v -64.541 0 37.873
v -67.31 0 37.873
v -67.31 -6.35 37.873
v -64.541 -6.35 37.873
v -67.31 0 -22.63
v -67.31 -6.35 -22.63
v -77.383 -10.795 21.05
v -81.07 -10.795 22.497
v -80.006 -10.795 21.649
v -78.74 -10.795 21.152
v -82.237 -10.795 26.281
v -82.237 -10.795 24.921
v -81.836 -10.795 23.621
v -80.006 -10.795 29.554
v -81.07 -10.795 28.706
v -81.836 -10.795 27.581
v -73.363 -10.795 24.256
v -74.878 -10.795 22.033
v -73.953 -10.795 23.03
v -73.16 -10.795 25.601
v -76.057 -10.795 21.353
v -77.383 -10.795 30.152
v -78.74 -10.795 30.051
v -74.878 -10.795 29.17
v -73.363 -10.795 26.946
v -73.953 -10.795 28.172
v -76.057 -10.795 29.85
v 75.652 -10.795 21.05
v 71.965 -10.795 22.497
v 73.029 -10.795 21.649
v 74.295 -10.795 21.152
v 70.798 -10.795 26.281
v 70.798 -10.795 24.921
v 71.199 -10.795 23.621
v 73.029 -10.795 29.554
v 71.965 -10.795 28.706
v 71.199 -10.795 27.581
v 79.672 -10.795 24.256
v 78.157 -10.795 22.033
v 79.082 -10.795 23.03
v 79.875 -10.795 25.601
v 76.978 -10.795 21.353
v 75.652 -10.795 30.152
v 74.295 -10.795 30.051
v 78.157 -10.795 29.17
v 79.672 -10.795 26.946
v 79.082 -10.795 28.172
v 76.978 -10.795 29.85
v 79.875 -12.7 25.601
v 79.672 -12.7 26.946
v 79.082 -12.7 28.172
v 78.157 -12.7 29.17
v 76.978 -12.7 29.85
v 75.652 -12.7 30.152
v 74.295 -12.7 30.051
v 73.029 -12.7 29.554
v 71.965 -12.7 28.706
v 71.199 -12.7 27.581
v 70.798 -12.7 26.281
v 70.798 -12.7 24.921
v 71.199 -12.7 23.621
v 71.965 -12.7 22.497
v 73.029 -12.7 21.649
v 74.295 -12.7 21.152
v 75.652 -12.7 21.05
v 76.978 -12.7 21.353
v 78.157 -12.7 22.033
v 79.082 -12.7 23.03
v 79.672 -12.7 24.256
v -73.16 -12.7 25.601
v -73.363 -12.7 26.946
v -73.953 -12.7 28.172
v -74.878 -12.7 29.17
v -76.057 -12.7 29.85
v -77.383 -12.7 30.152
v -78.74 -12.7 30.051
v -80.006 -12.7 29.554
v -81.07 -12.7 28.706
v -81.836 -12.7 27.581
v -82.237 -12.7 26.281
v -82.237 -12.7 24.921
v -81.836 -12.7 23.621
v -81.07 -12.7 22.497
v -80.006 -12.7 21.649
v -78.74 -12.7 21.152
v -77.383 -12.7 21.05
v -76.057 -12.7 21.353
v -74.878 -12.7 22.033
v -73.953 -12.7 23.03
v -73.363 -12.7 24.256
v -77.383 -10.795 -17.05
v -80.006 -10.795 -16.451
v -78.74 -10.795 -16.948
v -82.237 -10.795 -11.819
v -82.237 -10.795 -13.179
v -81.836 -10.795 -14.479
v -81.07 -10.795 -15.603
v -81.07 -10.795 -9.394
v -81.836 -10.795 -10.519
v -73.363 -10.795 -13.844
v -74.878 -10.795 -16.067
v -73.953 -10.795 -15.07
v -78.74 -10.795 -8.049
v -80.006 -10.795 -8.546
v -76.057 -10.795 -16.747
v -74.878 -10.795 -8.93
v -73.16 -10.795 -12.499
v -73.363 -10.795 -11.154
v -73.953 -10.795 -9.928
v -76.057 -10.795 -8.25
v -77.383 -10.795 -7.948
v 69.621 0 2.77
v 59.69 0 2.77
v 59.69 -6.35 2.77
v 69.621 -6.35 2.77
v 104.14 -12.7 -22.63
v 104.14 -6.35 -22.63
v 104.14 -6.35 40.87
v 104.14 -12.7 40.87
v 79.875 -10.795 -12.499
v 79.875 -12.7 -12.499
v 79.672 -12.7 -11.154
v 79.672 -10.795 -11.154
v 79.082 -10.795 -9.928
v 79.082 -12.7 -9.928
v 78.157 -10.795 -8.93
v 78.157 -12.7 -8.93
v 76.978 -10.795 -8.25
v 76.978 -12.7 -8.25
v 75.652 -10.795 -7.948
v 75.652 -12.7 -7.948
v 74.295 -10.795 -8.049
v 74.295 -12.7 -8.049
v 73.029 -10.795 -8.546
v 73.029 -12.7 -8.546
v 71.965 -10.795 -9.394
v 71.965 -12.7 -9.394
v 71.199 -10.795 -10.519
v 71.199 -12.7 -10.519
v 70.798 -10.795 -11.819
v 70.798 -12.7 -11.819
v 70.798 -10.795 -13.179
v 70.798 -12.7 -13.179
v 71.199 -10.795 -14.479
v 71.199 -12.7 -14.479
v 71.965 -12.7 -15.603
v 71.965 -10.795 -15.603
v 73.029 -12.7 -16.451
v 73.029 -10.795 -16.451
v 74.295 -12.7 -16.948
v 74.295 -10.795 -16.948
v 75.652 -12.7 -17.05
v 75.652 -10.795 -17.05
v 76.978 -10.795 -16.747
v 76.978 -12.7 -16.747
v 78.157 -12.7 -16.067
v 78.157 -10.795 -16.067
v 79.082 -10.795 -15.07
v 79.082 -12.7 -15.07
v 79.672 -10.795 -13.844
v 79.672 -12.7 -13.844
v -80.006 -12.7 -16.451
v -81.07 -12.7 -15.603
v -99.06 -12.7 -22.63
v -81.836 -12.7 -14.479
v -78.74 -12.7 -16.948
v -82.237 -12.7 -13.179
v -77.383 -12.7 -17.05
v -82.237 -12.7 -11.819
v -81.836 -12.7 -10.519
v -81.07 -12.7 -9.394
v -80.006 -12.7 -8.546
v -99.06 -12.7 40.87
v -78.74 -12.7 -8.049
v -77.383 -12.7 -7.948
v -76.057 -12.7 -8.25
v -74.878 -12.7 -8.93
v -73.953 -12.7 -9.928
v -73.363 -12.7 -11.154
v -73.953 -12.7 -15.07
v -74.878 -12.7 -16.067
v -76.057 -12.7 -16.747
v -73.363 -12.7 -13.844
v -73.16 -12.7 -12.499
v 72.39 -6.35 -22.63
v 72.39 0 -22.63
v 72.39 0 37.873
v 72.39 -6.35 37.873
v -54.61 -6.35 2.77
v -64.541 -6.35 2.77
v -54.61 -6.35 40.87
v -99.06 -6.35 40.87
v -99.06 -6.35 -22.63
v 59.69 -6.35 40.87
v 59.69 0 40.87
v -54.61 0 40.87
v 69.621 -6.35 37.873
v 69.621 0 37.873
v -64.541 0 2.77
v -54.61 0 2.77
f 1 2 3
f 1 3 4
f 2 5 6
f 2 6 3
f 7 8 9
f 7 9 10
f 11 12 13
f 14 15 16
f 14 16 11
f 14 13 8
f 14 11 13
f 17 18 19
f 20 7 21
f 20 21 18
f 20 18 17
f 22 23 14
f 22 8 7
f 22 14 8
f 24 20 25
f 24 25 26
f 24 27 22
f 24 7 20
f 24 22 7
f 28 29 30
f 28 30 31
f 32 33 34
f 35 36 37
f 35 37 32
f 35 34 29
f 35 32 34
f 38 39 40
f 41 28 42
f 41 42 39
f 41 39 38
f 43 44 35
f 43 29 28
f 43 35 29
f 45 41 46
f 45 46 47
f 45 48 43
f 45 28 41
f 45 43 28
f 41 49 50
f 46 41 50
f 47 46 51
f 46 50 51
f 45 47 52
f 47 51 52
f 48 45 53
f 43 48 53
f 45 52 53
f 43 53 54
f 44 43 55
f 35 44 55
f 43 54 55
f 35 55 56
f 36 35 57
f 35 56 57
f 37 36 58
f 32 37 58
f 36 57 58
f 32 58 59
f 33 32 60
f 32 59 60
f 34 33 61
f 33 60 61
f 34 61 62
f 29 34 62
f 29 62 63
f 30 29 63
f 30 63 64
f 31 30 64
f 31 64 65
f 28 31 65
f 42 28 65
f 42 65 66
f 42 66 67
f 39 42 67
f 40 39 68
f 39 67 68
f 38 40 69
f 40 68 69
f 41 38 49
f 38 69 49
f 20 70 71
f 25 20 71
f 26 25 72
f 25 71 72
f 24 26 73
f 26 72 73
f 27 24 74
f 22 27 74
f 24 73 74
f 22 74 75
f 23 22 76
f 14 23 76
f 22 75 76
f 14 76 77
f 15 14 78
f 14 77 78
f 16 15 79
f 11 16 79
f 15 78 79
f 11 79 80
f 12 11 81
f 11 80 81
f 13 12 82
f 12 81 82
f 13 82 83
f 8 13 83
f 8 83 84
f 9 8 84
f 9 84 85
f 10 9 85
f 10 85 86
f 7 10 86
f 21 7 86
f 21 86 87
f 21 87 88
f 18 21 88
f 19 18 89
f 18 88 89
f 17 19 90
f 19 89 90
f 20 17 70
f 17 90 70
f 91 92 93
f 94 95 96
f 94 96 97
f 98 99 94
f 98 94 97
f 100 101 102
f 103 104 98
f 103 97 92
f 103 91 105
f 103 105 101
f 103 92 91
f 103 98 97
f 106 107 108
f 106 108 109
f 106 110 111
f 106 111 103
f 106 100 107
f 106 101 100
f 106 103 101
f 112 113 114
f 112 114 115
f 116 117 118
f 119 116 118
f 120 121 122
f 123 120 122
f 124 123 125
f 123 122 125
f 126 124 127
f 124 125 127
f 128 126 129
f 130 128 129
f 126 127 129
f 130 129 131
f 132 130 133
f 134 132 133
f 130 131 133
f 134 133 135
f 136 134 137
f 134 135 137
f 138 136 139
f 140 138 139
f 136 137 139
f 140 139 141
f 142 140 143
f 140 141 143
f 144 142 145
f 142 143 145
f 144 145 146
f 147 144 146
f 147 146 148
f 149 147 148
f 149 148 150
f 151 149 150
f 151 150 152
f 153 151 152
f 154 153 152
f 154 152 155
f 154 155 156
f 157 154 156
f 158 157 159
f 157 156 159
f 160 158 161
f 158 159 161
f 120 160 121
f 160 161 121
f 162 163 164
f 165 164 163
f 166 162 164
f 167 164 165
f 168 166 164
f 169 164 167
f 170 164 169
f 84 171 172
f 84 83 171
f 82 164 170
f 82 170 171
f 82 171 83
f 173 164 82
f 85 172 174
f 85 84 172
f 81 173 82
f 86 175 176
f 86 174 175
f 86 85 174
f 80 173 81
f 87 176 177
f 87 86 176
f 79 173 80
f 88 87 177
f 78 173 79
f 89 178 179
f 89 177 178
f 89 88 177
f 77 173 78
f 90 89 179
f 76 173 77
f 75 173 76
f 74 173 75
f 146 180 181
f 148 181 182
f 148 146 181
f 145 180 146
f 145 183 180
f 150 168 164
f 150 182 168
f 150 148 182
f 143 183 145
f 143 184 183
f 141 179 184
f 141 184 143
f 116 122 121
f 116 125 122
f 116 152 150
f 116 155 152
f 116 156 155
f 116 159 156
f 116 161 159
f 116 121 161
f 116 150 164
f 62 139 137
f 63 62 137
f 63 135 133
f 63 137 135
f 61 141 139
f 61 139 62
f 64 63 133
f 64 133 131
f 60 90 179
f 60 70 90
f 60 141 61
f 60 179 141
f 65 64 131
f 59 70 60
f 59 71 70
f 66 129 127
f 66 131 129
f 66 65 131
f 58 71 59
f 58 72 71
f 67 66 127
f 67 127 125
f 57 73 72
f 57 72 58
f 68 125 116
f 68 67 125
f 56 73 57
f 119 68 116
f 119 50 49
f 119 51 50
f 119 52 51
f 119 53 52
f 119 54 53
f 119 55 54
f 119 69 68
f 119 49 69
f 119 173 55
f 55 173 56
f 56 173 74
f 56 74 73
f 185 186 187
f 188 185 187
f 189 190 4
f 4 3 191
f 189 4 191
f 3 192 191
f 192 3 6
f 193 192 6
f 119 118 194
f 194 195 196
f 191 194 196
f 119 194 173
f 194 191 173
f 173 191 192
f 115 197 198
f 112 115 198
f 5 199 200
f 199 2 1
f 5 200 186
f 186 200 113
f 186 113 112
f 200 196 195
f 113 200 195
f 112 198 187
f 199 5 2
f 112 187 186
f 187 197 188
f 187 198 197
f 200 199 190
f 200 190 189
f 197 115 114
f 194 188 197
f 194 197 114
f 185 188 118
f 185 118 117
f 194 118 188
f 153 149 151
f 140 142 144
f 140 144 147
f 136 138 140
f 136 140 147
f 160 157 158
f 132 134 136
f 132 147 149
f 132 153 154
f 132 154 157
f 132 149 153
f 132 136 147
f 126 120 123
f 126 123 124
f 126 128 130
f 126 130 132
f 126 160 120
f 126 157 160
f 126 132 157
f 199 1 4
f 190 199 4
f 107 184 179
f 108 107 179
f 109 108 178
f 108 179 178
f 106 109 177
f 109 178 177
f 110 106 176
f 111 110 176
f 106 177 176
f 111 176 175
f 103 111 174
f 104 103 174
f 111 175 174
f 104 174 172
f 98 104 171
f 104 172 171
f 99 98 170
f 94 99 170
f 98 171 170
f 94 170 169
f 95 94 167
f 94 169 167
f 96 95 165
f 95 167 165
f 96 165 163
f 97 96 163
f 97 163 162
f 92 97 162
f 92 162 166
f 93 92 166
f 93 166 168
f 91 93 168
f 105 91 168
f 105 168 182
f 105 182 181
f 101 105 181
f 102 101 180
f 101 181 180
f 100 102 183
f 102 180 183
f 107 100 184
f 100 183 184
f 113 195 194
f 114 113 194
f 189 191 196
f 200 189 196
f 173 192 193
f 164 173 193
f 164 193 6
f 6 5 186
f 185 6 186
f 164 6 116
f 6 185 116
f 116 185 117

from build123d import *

# Parameters (mm, degrees)
F1_DEPTH = 12.7
F2_R     = 4.564063
F3_DEPTH = 1.905
F4_W     = 31.75
F4_H     = 63.5
F5_DEPTH = 6.35
F6_W     = 2.7686
F6_H     = 6.35
F7_DEPTH = 2.9972
F8_DEPTH = 38.1


with BuildPart() as f1:
    # F0 (on Front) → F1 (new body)
    with BuildSketch(Plane.XZ):
        Polygon((104.14, 40.870185), (2.54, 40.870185), (-99.06, 40.870185), (-99.06, -22.629815), (2.54, -22.629815), (104.14, -22.629815), align=None)
    extrude(amount=F1_DEPTH)

    # F2 (on face) → F3 (cut)
    with BuildSketch(Plane.XZ.offset(12.7)):
        with Locations((-77.724032, -12.498807)):
            Circle(F2_R)
        with Locations((75.310968, -12.498807)):
            Circle(F2_R)
        with Locations((75.310968, 25.601193)):
            Circle(F2_R)
        with Locations((-77.724032, 25.601193)):
            Circle(F2_R)
    extrude(amount=-F3_DEPTH, mode=Mode.SUBTRACT)

    # F4 (on face) → F5 (cut)
    with BuildSketch(Plane(origin=(0, 0, 0), x_dir=(-1, 0, 0), z_dir=(0, 1, 0))):
        with Locations((-88.265, 9.120185)):
            Rectangle(F4_W, F4_H)
        with Locations((83.185, 9.120185)):
            Rectangle(F4_W, F4_H)
    extrude(amount=-F5_DEPTH, mode=Mode.SUBTRACT)

    # F6 (on face) → F7 (cut)
    with BuildSketch(Plane.XY.offset(40.870185)):
        with Locations((-65.9257, -3.175)):
            Rectangle(F6_W, F6_H)
        Polygon((-64.5414, 0), (-64.5414, -6.35), (-57.3786, -6.35), (-54.61, -6.35), (-54.61, 0), (-57.3786, 0), align=None)
        with Locations((71.0057, -3.175)):
            Rectangle(F6_W, F6_H)
        Polygon((62.4586, -6.35), (69.6214, -6.35), (69.6214, 0), (62.4586, 0), (59.69, 0), (59.69, -6.35), align=None)
    extrude(amount=-F7_DEPTH, mode=Mode.SUBTRACT)

    # F6 (on face) → F8 (cut)
    with BuildSketch(Plane.XY.offset(40.870185)):
        Polygon((-64.5414, 0), (-64.5414, -6.35), (-57.3786, -6.35), (-54.61, -6.35), (-54.61, 0), (-57.3786, 0), align=None)
        Polygon((62.4586, 0), (59.69, 0), (59.69, -6.35), (62.4586, -6.35), (69.6214, -6.35), (69.6214, 0), align=None)
    extrude(amount=-F8_DEPTH, mode=Mode.SUBTRACT)


solid = f1.part
